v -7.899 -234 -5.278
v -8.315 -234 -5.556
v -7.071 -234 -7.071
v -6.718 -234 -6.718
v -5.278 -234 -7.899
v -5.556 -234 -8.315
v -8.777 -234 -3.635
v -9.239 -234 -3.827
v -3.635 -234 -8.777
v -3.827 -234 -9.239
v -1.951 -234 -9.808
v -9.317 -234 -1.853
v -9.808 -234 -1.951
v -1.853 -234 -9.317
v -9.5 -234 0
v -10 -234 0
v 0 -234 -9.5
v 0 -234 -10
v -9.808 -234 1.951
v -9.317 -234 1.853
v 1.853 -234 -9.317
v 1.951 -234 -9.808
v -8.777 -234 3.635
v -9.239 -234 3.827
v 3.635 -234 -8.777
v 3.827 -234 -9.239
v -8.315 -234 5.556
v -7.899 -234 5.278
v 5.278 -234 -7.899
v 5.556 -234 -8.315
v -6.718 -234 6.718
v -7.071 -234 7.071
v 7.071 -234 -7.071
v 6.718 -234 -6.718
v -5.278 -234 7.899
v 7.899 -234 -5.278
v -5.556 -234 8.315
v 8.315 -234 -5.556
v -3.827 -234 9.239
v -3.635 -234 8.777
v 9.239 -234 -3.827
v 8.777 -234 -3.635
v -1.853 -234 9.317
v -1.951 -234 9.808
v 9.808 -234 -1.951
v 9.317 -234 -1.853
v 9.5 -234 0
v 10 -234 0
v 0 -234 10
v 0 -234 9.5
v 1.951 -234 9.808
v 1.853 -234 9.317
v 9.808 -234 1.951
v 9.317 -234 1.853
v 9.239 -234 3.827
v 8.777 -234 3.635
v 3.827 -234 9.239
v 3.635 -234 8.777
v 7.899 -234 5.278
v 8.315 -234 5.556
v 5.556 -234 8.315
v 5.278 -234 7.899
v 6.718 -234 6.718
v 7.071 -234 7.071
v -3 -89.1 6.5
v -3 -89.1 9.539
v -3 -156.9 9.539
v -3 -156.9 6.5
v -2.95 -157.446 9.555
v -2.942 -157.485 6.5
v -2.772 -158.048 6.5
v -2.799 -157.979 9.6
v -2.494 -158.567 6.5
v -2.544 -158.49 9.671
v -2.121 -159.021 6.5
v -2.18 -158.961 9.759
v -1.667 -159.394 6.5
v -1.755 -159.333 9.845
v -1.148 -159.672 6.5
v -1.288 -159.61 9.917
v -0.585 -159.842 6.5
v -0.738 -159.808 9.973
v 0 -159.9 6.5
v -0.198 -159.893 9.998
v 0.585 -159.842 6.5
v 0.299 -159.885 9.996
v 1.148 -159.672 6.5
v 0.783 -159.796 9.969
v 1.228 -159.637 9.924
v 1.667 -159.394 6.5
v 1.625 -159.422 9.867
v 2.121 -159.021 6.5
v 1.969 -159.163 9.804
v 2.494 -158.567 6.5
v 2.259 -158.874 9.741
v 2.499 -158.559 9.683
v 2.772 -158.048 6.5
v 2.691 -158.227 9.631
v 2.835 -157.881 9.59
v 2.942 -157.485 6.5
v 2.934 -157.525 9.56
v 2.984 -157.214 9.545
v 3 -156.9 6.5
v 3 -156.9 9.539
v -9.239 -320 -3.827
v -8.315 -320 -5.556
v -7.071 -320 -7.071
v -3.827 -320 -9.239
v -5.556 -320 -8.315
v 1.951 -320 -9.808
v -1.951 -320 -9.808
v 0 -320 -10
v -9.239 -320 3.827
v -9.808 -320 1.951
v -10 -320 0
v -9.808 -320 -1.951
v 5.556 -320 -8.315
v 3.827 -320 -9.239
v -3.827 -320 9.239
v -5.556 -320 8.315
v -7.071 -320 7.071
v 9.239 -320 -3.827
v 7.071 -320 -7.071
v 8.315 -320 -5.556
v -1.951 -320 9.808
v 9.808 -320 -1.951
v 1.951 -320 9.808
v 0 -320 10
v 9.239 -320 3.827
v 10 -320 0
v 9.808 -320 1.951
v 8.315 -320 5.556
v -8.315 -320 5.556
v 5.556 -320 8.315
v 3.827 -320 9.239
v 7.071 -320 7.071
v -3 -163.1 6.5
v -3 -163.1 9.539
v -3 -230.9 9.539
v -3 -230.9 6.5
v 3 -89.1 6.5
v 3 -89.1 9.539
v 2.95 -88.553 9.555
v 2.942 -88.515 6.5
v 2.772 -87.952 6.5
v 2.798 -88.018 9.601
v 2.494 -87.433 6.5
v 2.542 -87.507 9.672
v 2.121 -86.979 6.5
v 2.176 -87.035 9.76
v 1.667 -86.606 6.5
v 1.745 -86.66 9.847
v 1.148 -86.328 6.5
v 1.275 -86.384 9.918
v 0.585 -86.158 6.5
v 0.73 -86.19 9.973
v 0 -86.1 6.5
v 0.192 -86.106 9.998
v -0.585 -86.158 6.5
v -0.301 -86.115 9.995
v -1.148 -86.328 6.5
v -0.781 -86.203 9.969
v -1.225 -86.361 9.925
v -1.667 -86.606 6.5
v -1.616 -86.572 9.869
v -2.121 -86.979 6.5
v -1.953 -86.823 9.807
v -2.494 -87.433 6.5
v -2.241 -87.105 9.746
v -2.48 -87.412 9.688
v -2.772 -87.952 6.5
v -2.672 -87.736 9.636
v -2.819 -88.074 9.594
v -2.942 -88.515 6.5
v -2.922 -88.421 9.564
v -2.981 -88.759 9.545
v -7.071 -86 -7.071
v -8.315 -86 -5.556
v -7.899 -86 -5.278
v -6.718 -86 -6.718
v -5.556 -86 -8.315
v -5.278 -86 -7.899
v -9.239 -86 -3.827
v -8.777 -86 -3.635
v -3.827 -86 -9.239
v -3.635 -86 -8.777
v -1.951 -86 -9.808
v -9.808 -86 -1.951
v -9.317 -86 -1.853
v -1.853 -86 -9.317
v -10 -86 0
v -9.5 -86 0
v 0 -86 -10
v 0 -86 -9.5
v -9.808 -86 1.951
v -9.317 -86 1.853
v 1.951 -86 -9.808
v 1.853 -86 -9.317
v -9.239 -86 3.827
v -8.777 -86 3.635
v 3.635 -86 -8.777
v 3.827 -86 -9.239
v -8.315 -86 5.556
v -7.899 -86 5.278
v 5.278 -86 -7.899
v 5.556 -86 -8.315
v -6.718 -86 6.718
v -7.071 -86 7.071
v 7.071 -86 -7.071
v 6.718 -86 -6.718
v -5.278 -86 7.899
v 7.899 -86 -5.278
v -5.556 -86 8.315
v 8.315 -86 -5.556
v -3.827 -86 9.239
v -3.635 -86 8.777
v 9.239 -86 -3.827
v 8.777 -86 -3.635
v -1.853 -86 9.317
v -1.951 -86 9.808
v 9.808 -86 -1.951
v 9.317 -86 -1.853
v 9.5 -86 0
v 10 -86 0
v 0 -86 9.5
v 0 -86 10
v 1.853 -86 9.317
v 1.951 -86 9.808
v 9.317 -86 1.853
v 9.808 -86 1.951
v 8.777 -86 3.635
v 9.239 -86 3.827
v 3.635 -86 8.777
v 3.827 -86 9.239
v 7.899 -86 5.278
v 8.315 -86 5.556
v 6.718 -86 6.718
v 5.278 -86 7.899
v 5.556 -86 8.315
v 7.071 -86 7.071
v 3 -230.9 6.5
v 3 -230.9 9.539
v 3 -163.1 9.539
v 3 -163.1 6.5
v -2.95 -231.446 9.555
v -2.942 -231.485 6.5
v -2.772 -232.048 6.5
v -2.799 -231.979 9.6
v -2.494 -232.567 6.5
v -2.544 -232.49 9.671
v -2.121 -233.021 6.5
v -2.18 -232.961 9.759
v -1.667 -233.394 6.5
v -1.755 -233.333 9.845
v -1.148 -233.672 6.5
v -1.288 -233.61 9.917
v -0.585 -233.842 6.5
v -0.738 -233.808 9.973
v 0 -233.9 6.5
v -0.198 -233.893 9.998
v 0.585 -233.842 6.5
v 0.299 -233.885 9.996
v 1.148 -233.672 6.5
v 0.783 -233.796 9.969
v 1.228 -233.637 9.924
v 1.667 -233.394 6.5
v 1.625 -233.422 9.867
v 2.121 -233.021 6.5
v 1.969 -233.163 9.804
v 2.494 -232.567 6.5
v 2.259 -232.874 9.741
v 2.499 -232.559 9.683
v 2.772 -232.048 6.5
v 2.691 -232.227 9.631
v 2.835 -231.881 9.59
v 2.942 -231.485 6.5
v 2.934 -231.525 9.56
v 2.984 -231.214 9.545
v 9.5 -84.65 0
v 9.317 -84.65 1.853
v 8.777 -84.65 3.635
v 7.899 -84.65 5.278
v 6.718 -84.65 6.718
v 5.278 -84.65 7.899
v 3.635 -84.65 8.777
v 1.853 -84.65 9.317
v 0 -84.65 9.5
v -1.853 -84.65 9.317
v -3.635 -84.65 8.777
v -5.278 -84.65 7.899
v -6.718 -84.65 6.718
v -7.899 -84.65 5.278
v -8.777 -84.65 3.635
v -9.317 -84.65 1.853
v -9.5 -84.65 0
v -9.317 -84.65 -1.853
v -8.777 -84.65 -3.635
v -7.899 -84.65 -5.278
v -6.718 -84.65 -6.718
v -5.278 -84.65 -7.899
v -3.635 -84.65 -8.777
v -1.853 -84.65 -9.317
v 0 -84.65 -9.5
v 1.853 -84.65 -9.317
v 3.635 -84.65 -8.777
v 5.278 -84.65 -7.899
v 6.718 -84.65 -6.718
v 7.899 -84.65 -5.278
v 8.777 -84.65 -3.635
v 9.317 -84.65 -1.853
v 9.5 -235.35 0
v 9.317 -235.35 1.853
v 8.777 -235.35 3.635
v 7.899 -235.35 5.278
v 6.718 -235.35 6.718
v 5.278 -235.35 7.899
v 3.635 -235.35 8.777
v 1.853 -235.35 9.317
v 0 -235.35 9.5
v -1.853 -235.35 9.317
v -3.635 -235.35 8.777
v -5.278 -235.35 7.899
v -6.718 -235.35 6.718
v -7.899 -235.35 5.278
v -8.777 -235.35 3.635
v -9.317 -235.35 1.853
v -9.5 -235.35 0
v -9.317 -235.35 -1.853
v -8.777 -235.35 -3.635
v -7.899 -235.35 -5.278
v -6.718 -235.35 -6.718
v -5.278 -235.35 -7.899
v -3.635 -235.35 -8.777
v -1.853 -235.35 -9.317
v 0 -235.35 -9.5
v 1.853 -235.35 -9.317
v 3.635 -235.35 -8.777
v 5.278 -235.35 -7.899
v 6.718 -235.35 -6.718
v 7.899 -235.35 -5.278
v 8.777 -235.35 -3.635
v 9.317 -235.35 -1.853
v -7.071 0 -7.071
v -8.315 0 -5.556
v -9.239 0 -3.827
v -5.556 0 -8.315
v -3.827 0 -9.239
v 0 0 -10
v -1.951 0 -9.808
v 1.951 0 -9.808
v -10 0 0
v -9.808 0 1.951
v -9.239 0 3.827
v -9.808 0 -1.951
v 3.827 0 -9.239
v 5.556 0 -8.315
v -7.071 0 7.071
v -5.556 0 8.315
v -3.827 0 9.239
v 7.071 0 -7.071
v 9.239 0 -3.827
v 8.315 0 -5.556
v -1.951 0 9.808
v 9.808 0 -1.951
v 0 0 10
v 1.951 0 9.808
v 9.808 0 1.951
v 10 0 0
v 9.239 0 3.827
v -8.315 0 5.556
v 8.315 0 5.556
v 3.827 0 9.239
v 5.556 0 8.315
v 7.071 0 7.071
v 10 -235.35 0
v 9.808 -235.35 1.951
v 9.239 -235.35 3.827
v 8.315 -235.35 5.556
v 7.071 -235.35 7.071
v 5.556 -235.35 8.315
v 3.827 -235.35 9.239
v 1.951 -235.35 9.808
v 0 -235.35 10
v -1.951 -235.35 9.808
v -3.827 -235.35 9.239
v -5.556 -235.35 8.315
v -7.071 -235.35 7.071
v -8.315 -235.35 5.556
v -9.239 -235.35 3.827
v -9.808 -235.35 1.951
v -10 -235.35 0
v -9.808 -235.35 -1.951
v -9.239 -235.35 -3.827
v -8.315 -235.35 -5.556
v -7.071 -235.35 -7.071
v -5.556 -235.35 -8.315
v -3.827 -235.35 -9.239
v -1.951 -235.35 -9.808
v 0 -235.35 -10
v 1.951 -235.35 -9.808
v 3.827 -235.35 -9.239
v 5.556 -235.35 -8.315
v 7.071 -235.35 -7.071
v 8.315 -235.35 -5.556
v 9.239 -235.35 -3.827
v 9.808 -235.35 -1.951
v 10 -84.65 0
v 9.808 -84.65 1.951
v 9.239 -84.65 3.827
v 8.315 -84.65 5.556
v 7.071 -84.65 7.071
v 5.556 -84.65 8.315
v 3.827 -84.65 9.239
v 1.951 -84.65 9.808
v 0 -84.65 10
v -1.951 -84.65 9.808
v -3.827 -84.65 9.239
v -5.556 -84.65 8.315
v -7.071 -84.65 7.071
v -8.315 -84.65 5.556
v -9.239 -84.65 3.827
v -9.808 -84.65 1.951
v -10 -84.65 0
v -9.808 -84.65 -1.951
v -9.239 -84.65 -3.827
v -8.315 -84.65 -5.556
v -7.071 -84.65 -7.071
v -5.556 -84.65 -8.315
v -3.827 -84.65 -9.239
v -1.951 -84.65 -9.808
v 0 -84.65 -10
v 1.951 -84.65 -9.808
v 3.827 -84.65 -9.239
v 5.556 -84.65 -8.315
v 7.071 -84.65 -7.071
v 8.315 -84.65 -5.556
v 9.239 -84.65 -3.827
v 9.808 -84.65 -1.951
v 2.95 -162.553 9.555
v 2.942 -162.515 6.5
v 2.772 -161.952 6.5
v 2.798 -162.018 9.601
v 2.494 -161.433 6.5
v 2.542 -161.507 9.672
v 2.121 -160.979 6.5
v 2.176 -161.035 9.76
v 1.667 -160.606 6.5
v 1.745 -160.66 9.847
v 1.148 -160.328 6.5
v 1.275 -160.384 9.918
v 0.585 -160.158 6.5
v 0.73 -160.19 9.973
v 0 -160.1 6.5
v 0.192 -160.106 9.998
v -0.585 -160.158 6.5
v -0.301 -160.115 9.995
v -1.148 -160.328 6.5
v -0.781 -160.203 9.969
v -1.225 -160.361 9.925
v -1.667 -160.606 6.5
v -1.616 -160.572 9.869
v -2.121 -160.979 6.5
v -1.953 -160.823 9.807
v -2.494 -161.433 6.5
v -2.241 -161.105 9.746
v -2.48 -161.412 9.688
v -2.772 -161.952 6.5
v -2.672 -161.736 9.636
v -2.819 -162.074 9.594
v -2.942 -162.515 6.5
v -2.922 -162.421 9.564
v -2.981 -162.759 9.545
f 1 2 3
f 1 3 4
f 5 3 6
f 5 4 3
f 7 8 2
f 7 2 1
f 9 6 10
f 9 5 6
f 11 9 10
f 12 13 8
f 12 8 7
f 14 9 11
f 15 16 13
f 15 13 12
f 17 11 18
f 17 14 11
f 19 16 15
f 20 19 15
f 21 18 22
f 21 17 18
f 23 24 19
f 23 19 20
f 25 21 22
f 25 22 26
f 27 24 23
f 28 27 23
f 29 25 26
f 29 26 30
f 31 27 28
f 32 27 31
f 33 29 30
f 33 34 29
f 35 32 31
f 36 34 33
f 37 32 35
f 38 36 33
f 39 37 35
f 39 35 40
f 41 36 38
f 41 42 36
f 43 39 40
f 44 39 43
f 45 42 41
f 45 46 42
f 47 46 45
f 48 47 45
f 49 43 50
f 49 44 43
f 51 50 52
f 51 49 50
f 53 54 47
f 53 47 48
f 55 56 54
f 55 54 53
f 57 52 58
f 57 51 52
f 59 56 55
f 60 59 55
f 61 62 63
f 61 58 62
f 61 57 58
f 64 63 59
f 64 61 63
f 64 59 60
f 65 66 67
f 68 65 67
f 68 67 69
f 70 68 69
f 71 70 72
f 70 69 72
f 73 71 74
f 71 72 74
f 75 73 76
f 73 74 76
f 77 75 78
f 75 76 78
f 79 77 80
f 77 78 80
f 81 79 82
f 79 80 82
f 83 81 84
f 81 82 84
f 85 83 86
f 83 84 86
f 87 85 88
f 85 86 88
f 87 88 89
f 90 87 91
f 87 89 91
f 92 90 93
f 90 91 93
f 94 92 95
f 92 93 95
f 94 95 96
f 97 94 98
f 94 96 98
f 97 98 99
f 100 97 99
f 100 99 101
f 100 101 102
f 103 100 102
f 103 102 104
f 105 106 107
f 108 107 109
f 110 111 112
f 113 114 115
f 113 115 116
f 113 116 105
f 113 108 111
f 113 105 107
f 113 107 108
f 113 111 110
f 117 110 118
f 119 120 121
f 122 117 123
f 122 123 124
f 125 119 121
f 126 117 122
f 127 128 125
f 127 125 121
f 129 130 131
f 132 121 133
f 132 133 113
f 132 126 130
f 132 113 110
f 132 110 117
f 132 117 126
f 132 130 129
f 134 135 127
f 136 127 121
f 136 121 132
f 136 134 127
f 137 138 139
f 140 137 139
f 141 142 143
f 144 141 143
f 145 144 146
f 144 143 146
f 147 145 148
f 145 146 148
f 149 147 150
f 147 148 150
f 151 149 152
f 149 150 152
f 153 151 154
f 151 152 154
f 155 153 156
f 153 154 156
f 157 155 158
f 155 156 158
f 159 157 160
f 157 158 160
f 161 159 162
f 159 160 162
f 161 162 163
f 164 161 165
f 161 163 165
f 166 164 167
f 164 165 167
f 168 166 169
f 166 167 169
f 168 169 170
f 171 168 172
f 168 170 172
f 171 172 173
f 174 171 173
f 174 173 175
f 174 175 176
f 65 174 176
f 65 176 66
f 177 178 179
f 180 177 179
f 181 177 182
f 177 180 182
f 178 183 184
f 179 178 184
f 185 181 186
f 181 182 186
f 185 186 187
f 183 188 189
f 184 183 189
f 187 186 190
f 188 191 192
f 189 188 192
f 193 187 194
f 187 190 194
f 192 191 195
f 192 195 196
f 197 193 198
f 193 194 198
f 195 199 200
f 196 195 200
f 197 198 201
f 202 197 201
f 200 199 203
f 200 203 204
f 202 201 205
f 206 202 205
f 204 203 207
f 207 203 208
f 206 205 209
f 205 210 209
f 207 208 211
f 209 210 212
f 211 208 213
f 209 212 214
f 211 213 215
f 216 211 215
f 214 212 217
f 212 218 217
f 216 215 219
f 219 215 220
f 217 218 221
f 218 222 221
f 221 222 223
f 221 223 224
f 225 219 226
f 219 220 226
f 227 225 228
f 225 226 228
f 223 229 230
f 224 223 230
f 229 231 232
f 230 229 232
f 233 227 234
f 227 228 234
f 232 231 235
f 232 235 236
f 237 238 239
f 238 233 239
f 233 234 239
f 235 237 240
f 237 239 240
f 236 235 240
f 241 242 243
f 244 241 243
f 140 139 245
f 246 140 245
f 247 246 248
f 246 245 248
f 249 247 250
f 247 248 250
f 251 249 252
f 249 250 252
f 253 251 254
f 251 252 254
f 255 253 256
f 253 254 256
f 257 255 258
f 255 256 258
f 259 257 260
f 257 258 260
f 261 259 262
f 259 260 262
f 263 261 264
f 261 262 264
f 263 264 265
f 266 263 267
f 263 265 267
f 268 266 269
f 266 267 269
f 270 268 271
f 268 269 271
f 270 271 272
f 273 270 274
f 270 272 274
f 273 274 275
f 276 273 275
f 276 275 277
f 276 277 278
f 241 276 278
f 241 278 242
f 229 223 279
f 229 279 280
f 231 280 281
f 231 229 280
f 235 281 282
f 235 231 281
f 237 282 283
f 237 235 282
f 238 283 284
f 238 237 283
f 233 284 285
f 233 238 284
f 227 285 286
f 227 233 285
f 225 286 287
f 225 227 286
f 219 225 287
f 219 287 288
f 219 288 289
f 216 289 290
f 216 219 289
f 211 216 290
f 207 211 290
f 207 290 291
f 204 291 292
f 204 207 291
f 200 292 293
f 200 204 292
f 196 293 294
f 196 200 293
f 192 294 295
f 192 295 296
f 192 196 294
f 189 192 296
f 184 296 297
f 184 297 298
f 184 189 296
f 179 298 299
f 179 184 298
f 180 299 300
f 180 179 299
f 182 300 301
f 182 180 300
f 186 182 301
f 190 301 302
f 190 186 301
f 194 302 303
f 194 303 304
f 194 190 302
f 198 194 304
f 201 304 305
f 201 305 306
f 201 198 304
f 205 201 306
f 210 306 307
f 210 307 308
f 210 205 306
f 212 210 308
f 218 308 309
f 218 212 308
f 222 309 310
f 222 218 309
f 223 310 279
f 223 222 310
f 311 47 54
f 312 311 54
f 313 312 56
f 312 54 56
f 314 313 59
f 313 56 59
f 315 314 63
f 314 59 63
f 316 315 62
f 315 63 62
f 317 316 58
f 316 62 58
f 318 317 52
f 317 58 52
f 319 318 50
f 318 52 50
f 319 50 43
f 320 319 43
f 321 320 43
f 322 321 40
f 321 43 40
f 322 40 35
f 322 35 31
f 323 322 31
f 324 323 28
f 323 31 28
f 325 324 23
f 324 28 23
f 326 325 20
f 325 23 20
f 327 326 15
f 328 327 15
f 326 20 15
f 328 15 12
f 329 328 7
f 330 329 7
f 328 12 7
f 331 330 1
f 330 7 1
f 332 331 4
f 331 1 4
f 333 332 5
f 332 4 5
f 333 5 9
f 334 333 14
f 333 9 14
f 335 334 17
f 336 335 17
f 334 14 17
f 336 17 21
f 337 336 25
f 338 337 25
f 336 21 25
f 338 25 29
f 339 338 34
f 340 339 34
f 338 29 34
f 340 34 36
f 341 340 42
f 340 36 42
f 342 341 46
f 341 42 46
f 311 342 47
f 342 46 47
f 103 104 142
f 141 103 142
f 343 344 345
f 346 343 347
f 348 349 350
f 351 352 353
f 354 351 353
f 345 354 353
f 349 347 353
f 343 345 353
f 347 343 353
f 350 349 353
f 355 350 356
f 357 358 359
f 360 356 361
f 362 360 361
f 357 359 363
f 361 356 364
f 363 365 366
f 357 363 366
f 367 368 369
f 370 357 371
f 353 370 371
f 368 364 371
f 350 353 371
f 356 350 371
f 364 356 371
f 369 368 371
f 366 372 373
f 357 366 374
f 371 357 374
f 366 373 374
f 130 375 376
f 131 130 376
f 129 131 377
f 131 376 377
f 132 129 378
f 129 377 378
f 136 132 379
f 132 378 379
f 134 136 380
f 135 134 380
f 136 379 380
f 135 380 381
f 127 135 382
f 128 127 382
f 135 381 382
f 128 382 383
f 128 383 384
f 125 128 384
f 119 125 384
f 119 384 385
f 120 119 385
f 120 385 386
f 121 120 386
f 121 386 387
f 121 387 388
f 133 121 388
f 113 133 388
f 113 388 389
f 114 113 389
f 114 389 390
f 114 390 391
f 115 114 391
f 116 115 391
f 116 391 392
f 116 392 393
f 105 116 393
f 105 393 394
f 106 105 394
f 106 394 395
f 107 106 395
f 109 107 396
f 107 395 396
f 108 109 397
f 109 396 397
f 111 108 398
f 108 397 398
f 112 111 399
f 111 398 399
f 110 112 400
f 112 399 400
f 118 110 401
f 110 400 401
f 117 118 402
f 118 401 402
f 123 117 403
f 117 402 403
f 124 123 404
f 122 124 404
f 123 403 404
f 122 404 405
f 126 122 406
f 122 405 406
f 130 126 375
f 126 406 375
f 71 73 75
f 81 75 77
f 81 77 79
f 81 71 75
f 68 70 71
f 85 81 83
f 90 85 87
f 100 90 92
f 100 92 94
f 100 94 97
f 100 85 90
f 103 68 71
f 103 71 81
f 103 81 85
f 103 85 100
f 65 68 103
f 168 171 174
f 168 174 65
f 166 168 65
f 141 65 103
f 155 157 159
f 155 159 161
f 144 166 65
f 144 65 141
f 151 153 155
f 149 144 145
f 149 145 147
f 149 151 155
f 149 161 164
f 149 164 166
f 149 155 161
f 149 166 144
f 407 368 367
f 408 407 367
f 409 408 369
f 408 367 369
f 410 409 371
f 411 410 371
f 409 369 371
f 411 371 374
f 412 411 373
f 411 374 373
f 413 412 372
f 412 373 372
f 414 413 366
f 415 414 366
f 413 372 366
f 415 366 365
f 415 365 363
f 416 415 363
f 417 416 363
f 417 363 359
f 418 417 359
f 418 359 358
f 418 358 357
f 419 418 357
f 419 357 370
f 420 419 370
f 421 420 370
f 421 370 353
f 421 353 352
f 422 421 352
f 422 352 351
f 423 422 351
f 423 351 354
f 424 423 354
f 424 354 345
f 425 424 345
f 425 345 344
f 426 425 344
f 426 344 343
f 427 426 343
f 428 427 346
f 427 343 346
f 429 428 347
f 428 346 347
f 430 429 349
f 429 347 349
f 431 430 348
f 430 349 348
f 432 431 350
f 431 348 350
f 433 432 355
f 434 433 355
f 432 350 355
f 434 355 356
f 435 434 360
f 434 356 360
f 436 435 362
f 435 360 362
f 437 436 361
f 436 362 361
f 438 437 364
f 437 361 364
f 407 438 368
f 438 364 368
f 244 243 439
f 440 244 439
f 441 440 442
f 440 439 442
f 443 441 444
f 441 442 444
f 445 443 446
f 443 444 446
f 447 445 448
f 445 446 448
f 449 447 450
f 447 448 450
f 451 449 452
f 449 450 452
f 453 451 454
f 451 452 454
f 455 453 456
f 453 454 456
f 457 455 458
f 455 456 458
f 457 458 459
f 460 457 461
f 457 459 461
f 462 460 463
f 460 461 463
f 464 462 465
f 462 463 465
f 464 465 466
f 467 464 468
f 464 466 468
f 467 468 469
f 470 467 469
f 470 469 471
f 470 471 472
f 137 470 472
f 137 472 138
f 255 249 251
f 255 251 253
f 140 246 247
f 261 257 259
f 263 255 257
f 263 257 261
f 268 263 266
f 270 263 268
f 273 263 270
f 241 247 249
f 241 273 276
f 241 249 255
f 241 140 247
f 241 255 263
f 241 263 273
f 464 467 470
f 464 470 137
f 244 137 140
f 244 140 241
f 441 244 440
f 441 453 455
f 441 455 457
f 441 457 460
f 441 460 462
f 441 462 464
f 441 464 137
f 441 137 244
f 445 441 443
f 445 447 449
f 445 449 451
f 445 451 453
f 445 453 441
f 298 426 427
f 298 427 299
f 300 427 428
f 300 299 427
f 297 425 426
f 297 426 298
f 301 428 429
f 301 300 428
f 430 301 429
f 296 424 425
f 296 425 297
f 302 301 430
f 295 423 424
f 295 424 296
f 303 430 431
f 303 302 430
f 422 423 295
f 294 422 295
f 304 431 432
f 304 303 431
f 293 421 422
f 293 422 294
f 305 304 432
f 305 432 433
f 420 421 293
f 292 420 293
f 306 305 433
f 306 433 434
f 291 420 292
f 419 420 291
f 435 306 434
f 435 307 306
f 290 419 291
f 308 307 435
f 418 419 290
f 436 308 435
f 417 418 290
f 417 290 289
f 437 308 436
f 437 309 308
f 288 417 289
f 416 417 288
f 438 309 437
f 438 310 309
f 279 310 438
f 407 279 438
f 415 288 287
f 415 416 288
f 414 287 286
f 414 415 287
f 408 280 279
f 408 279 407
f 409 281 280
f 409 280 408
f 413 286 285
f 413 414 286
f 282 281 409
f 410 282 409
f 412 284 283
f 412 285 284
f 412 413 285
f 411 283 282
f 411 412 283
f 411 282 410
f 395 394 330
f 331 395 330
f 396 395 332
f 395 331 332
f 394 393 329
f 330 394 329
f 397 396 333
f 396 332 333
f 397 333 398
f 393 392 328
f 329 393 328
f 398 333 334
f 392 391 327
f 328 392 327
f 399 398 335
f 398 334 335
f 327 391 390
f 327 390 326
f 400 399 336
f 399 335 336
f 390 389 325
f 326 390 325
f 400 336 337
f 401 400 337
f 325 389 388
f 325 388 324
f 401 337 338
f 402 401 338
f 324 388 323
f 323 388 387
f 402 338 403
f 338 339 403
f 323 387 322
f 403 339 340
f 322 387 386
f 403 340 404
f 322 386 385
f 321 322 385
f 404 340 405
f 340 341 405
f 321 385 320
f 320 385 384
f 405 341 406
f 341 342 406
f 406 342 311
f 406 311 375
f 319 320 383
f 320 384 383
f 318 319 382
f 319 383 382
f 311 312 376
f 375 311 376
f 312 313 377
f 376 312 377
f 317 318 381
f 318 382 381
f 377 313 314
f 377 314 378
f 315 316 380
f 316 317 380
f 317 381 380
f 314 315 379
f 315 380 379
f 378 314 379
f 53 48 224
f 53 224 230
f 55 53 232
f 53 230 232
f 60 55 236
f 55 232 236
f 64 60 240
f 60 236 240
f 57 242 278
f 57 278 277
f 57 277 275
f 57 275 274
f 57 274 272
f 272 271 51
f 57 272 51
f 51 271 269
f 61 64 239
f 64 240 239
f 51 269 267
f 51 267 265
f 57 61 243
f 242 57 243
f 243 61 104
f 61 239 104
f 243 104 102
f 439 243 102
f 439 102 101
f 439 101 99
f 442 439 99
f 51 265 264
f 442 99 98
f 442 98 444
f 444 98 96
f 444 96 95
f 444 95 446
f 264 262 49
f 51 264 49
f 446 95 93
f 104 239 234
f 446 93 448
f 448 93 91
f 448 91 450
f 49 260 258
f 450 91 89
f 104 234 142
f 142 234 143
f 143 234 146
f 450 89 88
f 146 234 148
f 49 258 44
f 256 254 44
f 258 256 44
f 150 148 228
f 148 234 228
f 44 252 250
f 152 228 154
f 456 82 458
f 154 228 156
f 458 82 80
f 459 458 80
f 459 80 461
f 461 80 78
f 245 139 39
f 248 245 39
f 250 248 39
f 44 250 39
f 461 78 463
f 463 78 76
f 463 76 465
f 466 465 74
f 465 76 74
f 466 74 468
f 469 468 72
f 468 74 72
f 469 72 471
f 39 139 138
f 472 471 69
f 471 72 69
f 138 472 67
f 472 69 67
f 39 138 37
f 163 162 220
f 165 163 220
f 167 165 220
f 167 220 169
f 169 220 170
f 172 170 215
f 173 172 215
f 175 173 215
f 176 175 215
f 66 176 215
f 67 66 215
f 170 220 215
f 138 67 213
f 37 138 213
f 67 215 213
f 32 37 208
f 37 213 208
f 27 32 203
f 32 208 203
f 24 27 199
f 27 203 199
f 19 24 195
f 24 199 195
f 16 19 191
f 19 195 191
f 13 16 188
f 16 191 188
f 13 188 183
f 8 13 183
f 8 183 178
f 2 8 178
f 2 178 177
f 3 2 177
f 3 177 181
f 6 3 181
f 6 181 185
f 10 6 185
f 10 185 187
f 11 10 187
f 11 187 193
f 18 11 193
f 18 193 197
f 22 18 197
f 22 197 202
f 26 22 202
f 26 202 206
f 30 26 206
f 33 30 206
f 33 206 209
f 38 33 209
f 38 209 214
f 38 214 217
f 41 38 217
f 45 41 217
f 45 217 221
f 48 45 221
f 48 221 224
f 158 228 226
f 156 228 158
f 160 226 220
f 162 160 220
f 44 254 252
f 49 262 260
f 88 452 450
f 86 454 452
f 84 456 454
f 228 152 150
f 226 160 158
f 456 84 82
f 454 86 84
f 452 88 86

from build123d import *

# Parameters (mm, degrees)
F0_R      = 10
F1_DEPTH  = 320
F4_DEPTH  = 6
F6_R      = 10
F6_R_2    = 9.5
F7_DEPTH  = 1.35
F9_R      = 10
F9_R_2    = 9.5
F10_DEPTH = 1.35


with BuildPart() as f1:
    # F0 (on Front) → F1 (new body)
    with BuildSketch(Plane.XZ):
        Circle(F0_R)
    extrude(amount=F1_DEPTH)

    # F3 (on offset) → F4 (cut)
    with BuildSketch(Plane.XY.offset(12.5)):
        with BuildLine():
            Line((-3, -163.1), (-3, -230.9))
            Line((-3, -230.9), (3, -230.9))
            Line((3, -230.9), (3, -163.1))
            ThreePointArc((3, -163.1), (0, -166.1), (-3, -163.1))
        make_face()
        with BuildLine():
            ThreePointArc((3, -89.1), (0, -86.1), (-3, -89.1))
            Line((-3, -89.1), (3, -89.1))
        make_face()
        with BuildLine():
            Line((3, -230.9), (-3, -230.9))
            ThreePointArc((-3, -230.9), (0, -233.9), (3, -230.9))
        make_face()
        with BuildLine():
            Line((-3, -89.1), (-3, -156.9))
            ThreePointArc((-3, -156.9), (0, -153.9), (3, -156.9))
            Line((3, -156.9), (3, -89.1))
            Line((3, -89.1), (-3, -89.1))
        make_face()
        with BuildLine():
            ThreePointArc((3, -156.9), (0, -153.9), (-3, -156.9))
            ThreePointArc((-3, -156.9), (0, -159.9), (3, -156.9))
        make_face()
        with BuildLine():
            ThreePointArc((3, -163.1), (0, -160.1), (-3, -163.1))
            ThreePointArc((-3, -163.1), (0, -166.1), (3, -163.1))
        make_face()
    extrude(amount=-F4_DEPTH, mode=Mode.SUBTRACT)

    # F6 (on offset) → F7 (cut)
    with BuildSketch(Plane.XZ.offset(86)):
        Circle(F6_R)
        Circle(F6_R_2, mode=Mode.SUBTRACT)
    extrude(amount=-F7_DEPTH, mode=Mode.SUBTRACT)

    # F9 (on offset) → F10 (cut)
    with BuildSketch(Plane.XZ.offset(234)):
        Circle(F9_R)
        Circle(F9_R_2, mode=Mode.SUBTRACT)
    extrude(amount=F10_DEPTH, mode=Mode.SUBTRACT)


solid = f1.part
